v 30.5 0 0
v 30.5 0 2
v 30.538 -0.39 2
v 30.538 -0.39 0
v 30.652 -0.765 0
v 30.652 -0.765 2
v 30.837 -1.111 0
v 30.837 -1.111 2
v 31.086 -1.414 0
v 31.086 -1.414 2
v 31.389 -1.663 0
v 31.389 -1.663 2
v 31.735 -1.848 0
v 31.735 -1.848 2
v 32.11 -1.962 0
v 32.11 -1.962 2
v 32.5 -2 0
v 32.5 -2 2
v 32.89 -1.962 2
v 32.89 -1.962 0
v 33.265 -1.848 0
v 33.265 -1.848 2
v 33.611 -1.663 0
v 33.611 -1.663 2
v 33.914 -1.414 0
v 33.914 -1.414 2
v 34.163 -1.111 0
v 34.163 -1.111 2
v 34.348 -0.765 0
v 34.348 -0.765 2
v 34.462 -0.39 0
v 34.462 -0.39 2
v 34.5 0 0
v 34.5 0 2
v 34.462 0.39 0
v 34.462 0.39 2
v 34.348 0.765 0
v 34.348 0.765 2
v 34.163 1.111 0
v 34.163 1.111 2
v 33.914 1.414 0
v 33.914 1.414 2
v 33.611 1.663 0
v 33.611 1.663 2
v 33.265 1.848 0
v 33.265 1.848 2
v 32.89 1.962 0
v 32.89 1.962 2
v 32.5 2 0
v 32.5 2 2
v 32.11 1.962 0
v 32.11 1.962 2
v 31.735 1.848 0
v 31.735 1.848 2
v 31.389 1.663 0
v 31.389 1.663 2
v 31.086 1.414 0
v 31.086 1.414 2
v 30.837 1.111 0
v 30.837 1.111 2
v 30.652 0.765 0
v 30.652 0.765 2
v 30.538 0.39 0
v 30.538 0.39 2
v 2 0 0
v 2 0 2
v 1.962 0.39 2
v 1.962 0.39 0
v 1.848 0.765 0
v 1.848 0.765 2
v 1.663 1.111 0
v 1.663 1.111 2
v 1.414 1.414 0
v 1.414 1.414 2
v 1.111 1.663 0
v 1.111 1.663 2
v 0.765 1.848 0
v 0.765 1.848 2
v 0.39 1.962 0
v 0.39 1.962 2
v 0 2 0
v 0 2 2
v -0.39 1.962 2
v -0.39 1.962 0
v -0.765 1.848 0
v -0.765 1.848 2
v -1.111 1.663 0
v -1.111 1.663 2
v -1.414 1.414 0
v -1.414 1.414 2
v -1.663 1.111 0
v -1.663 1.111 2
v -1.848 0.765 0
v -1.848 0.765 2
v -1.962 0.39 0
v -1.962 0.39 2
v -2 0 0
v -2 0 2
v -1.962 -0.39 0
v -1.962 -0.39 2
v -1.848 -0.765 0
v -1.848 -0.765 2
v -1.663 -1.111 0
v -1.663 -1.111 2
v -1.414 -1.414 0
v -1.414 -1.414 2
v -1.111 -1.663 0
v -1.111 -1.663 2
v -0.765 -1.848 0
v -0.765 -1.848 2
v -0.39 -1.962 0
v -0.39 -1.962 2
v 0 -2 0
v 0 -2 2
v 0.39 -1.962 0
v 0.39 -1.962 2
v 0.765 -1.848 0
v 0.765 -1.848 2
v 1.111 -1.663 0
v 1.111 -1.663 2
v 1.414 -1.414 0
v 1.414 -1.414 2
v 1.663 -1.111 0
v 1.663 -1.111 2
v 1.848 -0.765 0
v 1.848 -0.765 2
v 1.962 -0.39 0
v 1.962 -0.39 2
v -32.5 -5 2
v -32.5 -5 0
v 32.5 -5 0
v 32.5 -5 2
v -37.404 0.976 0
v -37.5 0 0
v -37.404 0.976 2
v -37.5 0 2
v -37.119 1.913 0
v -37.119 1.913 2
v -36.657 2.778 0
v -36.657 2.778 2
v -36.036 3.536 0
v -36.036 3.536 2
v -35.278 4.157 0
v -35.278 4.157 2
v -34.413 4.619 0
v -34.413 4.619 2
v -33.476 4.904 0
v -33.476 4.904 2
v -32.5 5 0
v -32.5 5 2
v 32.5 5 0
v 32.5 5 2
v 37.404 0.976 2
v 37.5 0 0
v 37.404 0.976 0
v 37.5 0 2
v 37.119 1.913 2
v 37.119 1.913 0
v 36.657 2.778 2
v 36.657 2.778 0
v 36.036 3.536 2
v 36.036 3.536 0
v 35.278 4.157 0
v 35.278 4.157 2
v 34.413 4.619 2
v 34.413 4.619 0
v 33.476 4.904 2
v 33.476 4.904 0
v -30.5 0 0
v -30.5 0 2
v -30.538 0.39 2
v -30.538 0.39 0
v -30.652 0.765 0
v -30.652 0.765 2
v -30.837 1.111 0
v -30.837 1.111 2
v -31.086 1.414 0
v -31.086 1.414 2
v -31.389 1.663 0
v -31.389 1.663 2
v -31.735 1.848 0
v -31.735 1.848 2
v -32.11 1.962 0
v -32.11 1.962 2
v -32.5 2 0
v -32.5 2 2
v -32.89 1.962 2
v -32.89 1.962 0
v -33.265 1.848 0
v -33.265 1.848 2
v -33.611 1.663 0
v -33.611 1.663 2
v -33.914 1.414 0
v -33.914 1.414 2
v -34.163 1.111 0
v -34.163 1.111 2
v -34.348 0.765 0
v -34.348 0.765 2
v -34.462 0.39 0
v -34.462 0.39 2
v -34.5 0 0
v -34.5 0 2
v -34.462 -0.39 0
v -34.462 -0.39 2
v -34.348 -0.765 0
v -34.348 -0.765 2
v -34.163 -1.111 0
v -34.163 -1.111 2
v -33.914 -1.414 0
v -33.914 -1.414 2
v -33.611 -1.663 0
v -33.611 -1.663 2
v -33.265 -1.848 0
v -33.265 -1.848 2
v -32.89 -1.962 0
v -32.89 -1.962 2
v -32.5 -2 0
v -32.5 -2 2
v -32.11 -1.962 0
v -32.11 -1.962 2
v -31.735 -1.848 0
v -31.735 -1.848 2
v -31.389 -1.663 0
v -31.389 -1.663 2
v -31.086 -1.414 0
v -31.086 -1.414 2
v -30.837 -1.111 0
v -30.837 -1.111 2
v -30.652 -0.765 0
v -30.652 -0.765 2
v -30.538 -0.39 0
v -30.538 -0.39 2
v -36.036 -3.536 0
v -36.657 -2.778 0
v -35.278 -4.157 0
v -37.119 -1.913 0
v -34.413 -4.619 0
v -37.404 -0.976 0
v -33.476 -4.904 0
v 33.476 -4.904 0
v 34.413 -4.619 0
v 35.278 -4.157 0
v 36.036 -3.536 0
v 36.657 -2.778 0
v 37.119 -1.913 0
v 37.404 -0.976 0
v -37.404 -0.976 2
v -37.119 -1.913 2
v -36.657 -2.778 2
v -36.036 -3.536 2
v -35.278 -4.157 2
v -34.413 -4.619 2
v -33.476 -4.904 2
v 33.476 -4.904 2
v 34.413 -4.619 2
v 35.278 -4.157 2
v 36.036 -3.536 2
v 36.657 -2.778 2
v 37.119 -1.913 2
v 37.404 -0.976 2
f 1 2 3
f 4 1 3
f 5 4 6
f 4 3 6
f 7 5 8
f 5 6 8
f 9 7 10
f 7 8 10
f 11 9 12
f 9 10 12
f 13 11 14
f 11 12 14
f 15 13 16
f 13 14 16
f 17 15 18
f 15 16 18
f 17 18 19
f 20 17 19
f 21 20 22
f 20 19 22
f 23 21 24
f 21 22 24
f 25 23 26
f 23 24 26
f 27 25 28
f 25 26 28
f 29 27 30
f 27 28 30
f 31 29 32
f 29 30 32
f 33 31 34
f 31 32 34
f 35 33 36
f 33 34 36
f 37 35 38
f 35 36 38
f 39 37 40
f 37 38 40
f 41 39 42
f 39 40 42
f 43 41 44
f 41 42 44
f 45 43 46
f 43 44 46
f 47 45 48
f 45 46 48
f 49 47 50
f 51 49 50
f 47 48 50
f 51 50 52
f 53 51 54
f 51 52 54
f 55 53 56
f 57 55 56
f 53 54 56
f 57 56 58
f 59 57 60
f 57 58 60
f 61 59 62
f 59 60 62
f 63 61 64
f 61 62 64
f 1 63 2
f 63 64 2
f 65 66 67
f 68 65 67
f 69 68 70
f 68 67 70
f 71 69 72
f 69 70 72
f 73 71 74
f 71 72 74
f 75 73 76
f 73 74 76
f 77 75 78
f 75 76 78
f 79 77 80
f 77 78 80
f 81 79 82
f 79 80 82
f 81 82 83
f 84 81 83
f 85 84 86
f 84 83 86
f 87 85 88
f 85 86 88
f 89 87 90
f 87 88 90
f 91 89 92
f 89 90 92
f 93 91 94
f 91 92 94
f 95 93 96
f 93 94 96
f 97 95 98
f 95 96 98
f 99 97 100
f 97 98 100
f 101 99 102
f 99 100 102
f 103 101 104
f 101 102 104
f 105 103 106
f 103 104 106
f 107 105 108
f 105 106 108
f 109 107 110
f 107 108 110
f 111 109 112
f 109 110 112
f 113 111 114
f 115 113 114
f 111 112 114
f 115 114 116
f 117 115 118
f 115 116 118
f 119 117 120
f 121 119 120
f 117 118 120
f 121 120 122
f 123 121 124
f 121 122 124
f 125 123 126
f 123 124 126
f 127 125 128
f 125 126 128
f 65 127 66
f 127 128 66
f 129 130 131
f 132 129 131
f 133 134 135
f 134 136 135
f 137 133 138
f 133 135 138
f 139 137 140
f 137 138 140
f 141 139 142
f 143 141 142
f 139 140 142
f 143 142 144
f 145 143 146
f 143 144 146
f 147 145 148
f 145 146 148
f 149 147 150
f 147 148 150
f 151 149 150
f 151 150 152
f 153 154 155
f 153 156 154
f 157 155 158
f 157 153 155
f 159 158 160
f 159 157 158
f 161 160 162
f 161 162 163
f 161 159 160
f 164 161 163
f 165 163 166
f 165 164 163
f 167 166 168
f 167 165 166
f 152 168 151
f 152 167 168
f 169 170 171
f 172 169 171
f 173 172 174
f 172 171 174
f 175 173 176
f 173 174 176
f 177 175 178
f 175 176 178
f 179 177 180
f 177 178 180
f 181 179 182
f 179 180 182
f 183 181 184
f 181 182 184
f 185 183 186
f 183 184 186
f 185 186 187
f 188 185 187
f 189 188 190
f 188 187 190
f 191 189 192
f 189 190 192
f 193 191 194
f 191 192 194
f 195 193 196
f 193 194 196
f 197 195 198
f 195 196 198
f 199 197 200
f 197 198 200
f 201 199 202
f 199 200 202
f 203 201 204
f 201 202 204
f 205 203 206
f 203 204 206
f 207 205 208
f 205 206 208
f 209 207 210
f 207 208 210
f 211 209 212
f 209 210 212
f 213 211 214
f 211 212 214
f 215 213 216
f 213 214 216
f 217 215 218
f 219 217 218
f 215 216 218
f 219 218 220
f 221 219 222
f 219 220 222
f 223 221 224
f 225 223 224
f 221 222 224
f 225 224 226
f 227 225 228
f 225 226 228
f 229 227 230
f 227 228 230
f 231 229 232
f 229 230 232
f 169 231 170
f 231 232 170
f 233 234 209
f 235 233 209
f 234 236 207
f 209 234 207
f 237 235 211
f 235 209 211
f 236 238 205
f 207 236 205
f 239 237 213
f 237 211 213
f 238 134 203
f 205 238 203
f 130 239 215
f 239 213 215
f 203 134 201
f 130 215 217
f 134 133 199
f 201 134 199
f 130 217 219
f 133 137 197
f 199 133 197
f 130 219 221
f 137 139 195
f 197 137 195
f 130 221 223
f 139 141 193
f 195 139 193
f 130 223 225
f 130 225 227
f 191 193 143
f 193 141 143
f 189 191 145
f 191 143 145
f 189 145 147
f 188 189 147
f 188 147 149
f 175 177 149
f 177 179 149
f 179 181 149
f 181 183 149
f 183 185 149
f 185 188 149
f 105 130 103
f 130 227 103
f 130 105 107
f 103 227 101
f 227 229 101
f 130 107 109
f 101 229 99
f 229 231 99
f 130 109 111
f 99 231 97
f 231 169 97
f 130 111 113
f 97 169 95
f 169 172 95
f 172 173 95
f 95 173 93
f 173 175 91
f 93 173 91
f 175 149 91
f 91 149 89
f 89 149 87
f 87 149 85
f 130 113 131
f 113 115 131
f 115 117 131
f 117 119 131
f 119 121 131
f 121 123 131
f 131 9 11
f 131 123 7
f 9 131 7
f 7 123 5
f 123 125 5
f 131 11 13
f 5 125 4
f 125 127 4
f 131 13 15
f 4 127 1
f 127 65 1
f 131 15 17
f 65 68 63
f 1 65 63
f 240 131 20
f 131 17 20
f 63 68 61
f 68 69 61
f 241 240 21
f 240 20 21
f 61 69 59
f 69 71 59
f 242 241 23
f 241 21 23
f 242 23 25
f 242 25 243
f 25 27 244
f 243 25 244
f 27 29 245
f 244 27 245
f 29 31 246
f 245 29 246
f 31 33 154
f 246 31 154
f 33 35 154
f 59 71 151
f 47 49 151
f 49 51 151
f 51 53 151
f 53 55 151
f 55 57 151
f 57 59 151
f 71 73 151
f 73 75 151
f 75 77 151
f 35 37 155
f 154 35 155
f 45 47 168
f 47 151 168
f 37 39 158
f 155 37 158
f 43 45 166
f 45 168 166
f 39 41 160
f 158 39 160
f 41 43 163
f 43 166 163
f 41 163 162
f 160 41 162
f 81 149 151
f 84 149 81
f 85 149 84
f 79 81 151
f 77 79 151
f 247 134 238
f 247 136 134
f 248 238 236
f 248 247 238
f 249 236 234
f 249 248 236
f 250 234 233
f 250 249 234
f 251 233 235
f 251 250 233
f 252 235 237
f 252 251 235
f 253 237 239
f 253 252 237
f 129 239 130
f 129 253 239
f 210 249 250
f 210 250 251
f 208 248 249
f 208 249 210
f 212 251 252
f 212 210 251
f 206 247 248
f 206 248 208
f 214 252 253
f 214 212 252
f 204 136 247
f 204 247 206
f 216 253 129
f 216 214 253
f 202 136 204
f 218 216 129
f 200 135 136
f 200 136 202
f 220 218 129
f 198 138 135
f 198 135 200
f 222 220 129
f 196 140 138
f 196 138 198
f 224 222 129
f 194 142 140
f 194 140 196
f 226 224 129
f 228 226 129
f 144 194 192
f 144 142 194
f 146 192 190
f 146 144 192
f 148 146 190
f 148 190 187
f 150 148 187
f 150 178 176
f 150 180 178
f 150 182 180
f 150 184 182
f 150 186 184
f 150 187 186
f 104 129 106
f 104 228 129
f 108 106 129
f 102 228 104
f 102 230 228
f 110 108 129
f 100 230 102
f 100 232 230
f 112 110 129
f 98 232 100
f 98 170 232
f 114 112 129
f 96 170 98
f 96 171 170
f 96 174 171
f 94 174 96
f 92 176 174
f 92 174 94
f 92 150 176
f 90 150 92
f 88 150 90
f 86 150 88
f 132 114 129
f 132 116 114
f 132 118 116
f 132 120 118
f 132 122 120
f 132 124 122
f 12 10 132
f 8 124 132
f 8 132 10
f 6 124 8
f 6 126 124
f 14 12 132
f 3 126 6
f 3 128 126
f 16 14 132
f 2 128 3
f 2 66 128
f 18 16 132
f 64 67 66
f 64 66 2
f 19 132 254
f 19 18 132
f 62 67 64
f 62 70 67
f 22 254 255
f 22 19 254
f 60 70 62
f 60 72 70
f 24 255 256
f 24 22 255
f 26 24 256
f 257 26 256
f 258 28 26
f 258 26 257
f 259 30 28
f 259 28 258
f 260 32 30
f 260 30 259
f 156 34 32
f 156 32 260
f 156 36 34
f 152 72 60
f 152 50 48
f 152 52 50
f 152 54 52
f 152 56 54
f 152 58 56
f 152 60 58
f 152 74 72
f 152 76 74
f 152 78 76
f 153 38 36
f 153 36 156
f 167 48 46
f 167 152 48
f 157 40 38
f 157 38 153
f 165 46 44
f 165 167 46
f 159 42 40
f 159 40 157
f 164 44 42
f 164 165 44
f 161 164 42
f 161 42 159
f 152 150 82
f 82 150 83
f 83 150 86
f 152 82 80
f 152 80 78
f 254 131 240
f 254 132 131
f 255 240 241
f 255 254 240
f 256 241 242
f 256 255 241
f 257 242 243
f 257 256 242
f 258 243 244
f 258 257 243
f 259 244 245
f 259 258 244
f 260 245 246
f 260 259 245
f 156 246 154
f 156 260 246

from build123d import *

# Parameters (mm, degrees)
SKETCH_1_W          = 75
SKETCH_1_H          = 10
EXTRUDE_1_DEPTH     = 2
FILLET_1_R          = 5
SKETCH_3_R          = 2
CUT_EXTRUDE_1_DEPTH = 2


with BuildPart() as part:
    # 草图1 → 凸台-拉伸1 (new body)
    with BuildSketch(Plane.XY):
        Rectangle(SKETCH_1_W, SKETCH_1_H)
    extrude(amount=EXTRUDE_1_DEPTH)

    # 圆角1
    fillet_1_edges = [part.edges().sort_by_distance(p)[0] for p in [
        (37.5, -5, 1),
        (-37.5, -5, 1),
        (-37.5, 5, 1),
        (37.5, 5, 1),
    ]]
    fillet(fillet_1_edges, radius=FILLET_1_R - 0.0001)  # a hair under: the kernel refuses the full size

    # 草图3 → 切除-拉伸1 (cut)
    with BuildSketch(Plane.XY.offset(2)):
        with Locations((-32.5, 0)):
            Circle(SKETCH_3_R)
        with Locations(Location((32.5, 0, 0), (0, 0, 180))):
            Circle(SKETCH_3_R)
        Circle(SKETCH_3_R)
    extrude(amount=-CUT_EXTRUDE_1_DEPTH, mode=Mode.SUBTRACT)


solid = part.part
